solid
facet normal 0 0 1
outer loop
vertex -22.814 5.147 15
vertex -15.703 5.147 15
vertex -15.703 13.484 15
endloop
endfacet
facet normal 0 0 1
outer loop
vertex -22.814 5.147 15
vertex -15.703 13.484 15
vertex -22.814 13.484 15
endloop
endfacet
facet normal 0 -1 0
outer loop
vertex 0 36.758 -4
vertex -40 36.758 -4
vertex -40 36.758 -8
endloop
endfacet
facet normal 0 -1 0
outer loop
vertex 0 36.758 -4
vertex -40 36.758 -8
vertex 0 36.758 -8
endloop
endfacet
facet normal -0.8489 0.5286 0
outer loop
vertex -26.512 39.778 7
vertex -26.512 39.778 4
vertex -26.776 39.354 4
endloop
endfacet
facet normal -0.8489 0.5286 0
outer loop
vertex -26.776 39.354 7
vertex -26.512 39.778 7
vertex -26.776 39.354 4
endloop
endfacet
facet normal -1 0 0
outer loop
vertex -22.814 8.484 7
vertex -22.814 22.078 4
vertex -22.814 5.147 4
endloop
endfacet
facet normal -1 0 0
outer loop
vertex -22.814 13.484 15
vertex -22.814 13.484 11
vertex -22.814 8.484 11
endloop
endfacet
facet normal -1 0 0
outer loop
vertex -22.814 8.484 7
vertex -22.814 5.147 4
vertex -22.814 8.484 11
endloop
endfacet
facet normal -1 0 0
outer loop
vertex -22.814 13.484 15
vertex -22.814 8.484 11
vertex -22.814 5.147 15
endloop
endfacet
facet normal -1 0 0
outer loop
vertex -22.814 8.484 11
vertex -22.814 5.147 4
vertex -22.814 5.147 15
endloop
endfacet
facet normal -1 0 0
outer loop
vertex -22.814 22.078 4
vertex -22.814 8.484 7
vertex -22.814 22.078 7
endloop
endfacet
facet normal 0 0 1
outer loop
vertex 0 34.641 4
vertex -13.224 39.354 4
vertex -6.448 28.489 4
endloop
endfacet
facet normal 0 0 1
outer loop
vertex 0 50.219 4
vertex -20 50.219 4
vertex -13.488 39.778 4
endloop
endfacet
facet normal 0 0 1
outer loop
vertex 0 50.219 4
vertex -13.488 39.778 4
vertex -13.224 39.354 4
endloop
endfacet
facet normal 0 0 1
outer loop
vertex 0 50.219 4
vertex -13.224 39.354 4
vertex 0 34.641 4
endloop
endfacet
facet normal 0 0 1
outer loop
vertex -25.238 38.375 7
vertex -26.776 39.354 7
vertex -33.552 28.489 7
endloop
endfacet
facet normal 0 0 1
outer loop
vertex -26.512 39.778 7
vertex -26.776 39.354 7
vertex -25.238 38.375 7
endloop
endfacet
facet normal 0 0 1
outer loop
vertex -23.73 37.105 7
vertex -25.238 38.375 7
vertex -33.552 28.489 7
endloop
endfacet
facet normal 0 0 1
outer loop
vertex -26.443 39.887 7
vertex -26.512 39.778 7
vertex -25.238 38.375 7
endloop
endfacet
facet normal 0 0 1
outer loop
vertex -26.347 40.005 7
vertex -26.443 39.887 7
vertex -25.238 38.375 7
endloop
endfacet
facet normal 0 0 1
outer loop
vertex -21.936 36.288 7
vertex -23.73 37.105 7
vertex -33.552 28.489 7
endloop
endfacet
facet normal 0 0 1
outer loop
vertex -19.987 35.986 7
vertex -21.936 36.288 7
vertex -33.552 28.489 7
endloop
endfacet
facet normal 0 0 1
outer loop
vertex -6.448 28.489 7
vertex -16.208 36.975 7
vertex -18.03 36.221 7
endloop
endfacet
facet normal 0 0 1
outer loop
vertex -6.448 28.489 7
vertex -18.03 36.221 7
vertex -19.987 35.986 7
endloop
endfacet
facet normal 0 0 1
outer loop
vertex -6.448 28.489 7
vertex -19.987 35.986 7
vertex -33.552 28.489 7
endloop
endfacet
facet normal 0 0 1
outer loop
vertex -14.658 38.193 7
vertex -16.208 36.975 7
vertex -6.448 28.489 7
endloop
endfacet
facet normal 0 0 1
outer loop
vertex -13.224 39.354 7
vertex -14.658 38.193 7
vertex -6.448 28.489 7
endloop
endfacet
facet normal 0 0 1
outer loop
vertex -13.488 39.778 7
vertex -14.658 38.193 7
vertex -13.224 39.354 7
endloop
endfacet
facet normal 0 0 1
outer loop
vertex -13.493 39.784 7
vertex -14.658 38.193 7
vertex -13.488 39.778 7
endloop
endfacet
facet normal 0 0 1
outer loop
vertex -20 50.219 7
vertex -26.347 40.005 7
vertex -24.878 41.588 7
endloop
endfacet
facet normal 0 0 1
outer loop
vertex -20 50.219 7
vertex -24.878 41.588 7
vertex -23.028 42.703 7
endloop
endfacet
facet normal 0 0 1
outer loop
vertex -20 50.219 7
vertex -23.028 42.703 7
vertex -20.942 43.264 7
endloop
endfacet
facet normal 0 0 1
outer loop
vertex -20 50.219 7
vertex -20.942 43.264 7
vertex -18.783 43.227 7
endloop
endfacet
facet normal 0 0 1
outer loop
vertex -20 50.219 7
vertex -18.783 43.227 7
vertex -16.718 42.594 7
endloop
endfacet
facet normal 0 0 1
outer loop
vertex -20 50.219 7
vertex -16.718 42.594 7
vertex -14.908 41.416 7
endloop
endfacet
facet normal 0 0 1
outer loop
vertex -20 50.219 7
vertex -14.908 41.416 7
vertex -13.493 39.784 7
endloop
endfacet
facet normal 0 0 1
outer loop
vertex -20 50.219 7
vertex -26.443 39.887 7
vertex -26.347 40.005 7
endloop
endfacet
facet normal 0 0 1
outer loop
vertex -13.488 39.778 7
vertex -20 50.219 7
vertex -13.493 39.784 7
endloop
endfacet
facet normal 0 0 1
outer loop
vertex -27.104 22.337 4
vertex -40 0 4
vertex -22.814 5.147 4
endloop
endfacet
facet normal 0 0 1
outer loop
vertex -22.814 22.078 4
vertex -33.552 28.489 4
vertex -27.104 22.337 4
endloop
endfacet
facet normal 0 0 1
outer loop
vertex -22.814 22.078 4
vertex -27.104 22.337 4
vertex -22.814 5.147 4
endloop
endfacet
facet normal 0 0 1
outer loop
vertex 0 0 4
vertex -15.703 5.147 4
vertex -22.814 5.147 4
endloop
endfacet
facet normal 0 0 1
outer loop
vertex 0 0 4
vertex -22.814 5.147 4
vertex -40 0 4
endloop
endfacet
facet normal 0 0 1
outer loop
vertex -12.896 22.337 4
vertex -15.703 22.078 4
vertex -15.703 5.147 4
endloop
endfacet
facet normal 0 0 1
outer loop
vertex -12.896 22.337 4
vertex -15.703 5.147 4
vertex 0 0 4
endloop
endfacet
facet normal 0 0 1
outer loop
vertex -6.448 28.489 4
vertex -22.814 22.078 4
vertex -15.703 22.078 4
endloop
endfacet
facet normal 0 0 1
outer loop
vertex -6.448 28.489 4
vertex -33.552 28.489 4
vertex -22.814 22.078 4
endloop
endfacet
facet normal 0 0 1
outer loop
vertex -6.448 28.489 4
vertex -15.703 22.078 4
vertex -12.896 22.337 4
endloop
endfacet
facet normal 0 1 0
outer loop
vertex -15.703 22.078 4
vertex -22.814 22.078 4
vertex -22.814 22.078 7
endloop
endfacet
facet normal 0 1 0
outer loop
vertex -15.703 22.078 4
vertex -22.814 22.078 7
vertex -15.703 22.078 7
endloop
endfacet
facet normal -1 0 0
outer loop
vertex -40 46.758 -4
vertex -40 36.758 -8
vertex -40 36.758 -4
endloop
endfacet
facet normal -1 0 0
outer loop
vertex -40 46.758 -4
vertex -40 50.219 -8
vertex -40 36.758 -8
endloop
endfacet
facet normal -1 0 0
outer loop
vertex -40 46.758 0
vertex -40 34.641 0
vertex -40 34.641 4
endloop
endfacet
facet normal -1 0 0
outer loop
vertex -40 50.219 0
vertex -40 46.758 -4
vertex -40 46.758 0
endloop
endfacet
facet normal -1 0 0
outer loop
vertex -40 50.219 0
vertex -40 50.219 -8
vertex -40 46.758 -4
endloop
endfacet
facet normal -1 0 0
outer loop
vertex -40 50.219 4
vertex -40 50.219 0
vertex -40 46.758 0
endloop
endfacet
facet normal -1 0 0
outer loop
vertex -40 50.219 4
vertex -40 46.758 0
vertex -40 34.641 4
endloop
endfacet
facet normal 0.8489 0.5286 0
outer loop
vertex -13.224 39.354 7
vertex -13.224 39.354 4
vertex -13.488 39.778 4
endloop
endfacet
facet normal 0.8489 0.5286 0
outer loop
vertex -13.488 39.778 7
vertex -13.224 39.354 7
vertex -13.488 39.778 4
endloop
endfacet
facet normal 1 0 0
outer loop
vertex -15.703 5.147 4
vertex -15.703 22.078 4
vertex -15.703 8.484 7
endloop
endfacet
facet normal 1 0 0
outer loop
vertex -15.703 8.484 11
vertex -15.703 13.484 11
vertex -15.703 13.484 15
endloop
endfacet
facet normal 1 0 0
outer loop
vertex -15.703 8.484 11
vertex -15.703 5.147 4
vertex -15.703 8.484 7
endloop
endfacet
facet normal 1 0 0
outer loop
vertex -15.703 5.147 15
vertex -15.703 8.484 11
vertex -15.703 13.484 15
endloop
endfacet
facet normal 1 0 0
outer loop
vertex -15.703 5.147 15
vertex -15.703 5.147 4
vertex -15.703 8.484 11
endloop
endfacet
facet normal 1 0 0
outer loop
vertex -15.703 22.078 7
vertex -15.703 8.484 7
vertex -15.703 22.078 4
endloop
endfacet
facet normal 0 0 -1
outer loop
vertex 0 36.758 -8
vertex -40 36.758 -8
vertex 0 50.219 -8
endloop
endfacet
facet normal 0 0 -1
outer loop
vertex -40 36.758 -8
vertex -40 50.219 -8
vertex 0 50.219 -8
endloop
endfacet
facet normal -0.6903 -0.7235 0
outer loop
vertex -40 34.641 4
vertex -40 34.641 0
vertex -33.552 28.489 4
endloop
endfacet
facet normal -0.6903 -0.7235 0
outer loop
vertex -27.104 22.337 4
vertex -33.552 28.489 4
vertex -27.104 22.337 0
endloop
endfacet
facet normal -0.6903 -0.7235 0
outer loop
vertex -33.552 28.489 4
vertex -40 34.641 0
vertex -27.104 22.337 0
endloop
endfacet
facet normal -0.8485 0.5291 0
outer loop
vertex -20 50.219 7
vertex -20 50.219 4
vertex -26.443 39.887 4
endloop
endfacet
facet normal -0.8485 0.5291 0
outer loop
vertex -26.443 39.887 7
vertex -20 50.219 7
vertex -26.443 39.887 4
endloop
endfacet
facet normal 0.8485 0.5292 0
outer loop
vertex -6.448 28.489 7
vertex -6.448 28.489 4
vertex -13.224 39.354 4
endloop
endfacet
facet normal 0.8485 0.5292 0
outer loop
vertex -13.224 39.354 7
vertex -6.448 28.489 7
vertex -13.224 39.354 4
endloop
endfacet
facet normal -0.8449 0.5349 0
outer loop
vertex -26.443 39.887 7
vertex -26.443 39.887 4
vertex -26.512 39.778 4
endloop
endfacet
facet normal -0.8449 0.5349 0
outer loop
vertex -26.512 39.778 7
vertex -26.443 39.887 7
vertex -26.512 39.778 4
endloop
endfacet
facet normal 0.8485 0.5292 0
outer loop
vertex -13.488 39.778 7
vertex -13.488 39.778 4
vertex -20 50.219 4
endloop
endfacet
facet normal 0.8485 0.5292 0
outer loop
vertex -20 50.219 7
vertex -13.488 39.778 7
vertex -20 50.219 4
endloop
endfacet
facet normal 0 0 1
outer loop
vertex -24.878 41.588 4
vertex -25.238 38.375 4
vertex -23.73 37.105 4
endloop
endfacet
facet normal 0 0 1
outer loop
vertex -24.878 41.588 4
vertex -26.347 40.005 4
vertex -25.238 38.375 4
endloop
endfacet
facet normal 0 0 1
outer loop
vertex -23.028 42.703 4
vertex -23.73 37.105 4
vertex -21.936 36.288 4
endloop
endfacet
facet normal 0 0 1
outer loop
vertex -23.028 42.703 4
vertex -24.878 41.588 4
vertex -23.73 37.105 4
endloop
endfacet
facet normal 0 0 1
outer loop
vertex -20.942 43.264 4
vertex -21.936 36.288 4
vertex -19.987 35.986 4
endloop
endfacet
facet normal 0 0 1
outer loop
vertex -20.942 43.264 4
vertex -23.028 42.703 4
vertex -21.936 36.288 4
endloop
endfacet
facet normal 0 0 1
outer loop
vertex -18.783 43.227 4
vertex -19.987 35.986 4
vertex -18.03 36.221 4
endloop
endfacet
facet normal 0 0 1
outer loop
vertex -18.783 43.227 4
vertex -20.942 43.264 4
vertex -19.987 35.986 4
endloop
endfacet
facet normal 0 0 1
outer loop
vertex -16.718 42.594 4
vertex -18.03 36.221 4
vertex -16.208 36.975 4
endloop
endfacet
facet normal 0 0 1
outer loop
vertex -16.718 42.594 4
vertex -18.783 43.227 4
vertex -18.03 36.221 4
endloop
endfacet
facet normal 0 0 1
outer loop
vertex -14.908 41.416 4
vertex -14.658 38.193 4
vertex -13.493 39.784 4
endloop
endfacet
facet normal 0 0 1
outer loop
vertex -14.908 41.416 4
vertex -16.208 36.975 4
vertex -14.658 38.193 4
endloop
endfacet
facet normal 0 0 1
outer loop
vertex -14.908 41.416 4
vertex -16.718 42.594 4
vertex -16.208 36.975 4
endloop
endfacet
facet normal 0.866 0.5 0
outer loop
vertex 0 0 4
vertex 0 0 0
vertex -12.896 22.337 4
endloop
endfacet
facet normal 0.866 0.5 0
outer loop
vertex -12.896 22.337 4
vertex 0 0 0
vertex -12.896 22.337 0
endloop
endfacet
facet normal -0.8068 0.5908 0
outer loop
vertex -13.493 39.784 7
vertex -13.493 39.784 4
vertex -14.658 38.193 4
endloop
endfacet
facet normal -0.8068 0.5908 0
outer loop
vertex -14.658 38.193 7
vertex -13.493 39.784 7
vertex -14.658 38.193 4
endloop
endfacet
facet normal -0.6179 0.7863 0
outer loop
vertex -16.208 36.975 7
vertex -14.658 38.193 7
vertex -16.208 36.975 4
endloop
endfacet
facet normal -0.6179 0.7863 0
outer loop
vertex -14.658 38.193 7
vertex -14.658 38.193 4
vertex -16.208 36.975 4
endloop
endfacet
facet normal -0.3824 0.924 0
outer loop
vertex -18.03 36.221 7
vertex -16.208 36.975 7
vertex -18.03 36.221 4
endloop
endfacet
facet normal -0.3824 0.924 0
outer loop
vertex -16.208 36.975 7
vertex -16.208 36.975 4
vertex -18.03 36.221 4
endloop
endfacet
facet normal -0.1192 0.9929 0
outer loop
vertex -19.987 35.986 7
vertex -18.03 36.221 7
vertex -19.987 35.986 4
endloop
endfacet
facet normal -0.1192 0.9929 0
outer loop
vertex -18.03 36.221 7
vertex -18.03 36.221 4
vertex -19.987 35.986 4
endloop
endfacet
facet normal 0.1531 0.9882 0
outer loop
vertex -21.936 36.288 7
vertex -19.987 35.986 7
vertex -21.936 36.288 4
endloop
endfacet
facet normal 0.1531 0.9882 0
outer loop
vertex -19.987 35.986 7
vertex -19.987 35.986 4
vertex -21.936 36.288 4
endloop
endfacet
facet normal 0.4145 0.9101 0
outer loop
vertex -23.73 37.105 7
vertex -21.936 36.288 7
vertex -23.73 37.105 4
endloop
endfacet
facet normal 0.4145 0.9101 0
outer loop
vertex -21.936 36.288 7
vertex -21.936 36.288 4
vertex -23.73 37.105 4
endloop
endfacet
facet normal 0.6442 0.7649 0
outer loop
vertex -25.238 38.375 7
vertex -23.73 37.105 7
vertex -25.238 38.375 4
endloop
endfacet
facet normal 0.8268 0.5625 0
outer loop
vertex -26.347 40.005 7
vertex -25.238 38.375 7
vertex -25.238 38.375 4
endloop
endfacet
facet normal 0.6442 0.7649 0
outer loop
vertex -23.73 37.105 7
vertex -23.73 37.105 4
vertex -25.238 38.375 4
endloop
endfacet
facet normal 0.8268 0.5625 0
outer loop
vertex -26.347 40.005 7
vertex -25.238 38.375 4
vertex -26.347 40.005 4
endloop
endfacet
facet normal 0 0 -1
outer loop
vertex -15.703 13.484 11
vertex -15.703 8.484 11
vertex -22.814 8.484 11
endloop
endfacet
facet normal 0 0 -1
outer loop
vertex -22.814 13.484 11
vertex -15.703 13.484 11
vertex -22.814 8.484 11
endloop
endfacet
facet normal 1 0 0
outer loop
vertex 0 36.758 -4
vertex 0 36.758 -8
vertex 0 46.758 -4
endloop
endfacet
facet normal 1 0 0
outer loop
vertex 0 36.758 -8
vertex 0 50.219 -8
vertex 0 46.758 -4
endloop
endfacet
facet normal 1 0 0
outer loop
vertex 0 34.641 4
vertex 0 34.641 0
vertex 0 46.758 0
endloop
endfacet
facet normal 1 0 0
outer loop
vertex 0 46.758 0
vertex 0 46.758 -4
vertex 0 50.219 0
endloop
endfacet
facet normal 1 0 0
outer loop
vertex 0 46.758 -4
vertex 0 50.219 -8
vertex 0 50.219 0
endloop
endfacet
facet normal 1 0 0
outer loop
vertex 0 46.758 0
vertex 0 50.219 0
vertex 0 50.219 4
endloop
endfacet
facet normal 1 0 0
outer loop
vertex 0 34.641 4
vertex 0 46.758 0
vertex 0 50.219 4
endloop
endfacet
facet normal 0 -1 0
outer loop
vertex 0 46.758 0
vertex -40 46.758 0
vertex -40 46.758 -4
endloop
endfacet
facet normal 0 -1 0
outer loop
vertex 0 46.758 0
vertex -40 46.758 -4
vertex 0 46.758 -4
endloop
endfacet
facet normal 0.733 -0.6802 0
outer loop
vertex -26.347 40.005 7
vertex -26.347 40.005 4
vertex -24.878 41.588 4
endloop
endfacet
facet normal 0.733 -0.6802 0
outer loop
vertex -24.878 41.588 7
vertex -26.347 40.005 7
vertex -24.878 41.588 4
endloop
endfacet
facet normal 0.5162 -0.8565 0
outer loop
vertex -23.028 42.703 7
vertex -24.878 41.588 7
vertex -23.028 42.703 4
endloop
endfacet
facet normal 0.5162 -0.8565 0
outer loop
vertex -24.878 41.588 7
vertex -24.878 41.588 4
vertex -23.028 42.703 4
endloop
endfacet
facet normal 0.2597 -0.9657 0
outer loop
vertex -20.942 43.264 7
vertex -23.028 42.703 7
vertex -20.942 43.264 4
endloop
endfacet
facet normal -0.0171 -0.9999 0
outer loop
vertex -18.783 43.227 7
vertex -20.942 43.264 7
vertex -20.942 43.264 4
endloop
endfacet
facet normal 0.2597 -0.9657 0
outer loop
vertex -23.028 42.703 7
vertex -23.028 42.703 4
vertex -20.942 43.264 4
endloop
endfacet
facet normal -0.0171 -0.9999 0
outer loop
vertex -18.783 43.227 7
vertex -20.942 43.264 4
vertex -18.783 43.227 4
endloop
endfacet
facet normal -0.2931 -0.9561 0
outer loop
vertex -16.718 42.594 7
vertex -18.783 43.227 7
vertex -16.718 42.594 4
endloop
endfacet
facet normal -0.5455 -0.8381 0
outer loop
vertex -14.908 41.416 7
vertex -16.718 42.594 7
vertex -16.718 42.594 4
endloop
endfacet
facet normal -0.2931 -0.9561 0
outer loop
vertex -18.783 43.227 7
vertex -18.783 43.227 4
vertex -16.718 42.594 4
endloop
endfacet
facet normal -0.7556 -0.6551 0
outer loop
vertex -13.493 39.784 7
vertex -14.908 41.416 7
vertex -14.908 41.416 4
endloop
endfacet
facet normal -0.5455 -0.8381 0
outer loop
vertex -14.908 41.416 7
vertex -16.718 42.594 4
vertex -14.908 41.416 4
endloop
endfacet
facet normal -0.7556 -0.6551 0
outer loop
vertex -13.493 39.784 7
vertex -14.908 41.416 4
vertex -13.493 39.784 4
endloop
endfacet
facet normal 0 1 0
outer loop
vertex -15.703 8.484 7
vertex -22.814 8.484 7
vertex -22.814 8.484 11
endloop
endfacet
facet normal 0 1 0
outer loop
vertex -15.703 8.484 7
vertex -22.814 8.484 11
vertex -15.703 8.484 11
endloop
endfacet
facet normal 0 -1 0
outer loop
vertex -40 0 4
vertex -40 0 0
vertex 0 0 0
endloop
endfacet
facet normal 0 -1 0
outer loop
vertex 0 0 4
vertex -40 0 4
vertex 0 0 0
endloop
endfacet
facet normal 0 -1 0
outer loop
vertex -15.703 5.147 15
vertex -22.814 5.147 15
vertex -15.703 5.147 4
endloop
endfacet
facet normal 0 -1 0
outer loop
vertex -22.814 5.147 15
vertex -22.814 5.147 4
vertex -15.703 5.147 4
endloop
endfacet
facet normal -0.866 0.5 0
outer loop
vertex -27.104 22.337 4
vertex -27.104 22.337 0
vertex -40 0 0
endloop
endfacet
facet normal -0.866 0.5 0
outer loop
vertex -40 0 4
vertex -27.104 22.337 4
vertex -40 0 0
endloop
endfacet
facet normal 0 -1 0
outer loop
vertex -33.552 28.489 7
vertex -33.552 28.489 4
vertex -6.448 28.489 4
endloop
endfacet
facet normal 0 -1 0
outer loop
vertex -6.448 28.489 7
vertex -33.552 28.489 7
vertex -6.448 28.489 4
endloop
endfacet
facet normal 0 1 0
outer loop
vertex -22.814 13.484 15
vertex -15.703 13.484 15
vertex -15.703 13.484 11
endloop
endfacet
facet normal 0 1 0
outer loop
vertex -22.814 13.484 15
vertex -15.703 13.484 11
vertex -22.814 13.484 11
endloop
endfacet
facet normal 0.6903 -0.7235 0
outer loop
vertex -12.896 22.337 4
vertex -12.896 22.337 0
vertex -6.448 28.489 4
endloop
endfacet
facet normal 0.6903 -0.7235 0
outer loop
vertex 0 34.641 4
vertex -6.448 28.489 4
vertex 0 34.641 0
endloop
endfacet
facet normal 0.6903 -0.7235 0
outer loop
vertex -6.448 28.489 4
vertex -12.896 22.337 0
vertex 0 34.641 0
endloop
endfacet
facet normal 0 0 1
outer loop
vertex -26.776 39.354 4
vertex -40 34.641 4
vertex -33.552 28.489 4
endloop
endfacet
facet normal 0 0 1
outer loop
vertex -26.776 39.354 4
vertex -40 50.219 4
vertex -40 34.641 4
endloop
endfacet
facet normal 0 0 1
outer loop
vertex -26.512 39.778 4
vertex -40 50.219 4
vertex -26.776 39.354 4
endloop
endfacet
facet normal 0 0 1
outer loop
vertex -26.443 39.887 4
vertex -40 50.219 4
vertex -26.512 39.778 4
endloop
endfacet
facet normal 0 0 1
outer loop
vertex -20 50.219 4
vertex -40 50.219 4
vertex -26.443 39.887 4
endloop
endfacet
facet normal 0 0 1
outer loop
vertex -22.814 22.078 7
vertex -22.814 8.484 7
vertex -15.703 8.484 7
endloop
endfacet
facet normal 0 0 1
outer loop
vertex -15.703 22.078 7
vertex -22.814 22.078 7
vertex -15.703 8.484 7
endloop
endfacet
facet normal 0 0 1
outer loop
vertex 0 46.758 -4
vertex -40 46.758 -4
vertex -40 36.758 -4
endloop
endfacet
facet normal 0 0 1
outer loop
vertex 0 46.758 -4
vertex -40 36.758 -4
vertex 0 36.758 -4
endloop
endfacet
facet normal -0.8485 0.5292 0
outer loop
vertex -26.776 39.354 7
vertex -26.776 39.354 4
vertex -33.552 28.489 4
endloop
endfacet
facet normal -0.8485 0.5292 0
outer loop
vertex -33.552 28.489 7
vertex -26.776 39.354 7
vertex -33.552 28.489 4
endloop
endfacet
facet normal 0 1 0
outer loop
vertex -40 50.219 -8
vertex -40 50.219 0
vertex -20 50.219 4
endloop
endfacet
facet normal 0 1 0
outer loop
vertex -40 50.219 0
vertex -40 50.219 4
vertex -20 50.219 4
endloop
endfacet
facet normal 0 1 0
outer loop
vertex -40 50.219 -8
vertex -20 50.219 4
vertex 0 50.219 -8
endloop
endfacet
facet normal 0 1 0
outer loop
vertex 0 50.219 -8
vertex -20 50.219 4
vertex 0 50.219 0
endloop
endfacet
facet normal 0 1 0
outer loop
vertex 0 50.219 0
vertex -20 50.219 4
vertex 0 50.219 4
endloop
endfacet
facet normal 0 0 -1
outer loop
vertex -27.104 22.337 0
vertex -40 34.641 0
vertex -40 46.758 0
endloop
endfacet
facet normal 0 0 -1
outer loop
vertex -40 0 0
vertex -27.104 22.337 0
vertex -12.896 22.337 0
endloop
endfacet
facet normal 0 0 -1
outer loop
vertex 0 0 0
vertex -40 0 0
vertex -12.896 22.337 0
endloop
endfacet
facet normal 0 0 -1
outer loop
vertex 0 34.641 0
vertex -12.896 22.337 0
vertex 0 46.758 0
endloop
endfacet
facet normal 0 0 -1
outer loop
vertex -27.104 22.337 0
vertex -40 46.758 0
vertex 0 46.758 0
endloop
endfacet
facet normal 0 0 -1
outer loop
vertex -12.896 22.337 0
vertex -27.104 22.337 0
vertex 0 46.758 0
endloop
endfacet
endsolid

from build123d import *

# Parameters (mm, degrees)
F1_DEPTH  = 4
F2_W      = 40
F2_H      = 3.4614801407
F3_DEPTH  = 8
F4_W      = 40
F4_H      = 4
F5_DEPTH  = 10
F6_W      = 7.1115158498
F6_H      = 16.9303966686
F7_DEPTH  = 3
F8_W      = 7.1115158498
F8_H      = 3.3362442628
F9_DEPTH  = 8
F10_W     = 7.1115158498
F10_H     = 4
F11_DEPTH = 5
F13_DEPTH = 3


with BuildPart() as f1:
    # F0 (on Top) → F1 (new body)
    with BuildSketch(Plane.XY):
        Polygon((-40, 0), (0, 0), (-12.8963018344, 22.337050007), (0, 34.6410161514), (0, 50.2190850675), (-40, 50.2190850675), (-40, 34.6410161514), (-27.1036981656, 22.337050007), align=None)
    extrude(amount=F1_DEPTH)

    # F2 (on face) → F3 (join)
    with BuildSketch(Plane(origin=(0, 0, 0), x_dir=(1, 0, 0), z_dir=(0, 0, -1))):
        with Locations((-20, -48.4883449972)):
            Rectangle(F2_W, F2_H)
    extrude(amount=F3_DEPTH)

    # F4 (on face) → F5 (join)
    with BuildSketch(Plane.XZ.offset(-46.7576049268)):
        with Locations((-20, -6)):
            Rectangle(F4_W, F4_H)
    extrude(amount=F5_DEPTH)

    # F6 (on face) → F7 (join)
    with BuildSketch(Plane.XY.offset(4)):
        with Locations((-19.2582923919, 13.6125446297)):
            Rectangle(F6_W, F6_H)
    extrude(amount=F7_DEPTH)

    # F8 (on face) → F9 (join)
    with BuildSketch(Plane.XY.offset(7)):
        with Locations((-19.2582923919, 6.8154684268)):
            Rectangle(F8_W, F8_H)
    extrude(amount=F9_DEPTH)

    # F10 (on face) → F11 (join)
    with BuildSketch(Plane(origin=(0, 8.4835905582, 0), x_dir=(-1, 0, 0), z_dir=(0, 1, 0))):
        with Locations((19.2582923919, 13)):
            Rectangle(F10_W, F10_H)
    extrude(amount=F11_DEPTH)

    # F12 (on face) → F13 (join)
    with BuildSketch(Plane.XY.offset(4)):
        Polygon((-20, 50.2190850675), (-26.4434188207, 39.887223703), (-26.5116588016, 39.7778025957), (-26.7759245414, 39.3540590733), (-33.5518490828, 28.4890330792), (-6.4481509172, 28.4890330792), (-13.2240754586, 39.3540590733), (-13.4883411984, 39.7778025957), align=None)
        with BuildLine():
            ThreePointArc((-26.3472255319, 40.0048010051), (-19.8613519763, 43.32080982), (-13.4933032095, 39.7838018835))
            ThreePointArc((-13.4933032095, 39.7838018835), (-19.9874553417, 35.9862880757), (-26.3472255319, 40.0048010051))
        make_face(mode=Mode.SUBTRACT)
    extrude(amount=F13_DEPTH)


solid = f1.part
